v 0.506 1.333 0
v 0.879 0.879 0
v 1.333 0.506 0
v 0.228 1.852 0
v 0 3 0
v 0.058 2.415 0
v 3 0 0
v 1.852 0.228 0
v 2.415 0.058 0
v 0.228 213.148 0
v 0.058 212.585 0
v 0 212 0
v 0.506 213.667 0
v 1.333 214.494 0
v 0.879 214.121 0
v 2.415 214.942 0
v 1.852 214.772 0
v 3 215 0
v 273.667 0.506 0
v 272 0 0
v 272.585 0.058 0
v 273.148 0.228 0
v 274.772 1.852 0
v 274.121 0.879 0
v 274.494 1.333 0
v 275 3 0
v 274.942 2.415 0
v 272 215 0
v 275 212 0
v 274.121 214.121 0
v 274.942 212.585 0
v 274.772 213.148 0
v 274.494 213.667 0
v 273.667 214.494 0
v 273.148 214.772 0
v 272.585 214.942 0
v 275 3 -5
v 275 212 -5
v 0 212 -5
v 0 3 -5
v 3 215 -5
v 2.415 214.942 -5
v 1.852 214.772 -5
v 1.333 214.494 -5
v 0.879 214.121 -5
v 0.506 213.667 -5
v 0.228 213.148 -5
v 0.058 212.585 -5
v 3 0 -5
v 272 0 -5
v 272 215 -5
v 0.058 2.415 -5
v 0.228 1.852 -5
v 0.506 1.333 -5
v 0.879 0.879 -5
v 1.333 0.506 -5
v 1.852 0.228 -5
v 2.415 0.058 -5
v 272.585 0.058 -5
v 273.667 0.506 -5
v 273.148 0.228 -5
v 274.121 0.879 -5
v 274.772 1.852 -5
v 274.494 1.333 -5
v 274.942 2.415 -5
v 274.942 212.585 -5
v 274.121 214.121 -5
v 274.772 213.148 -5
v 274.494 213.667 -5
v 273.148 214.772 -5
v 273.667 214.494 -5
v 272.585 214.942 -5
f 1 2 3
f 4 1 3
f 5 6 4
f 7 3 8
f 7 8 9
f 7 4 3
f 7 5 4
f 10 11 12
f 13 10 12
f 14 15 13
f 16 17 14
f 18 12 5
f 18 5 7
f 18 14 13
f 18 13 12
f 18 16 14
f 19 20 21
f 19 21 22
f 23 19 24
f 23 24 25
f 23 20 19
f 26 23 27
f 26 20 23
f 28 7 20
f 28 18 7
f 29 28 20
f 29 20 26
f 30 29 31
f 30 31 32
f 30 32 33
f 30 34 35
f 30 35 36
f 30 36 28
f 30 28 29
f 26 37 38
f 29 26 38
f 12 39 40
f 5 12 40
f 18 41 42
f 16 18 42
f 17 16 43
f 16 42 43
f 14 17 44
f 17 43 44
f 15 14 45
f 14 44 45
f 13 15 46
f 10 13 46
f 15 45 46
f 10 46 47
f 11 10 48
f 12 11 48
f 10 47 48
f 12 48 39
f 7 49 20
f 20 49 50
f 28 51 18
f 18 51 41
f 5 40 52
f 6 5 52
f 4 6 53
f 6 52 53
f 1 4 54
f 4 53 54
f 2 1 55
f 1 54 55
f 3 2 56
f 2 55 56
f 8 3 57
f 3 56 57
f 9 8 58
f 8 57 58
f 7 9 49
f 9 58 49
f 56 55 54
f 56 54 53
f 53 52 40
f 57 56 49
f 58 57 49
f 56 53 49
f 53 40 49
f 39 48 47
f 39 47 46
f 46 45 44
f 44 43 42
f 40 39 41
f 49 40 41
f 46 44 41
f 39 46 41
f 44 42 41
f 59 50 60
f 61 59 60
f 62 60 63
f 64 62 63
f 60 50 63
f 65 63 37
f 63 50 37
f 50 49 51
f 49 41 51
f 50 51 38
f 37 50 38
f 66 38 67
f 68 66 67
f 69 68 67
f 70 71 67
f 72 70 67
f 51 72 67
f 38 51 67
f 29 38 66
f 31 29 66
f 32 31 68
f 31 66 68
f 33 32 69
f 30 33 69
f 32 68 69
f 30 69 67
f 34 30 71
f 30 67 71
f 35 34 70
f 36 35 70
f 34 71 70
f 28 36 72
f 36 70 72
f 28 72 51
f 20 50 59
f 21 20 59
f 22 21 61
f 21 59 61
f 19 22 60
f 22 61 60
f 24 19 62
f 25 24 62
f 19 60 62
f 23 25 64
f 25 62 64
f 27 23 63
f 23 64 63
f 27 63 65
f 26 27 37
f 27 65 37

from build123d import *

# Parameters (mm, degrees)
CONVERT_SOLID1_START = -5
CONVERT_SOLID1_DEPTH = 5


# Read off the part's stored shape, not the designer's step: Convert-Solid1
with BuildPart() as part:
    # Convert-Solid1 outline → Convert-Solid1 (new body)
    with BuildSketch(Plane.XY.offset(CONVERT_SOLID1_START)):
        with BuildLine():
            ThreePointArc((3, 215), (0.878679656, 214.121320344), (0, 212))
            Line((0, 212), (0, 3))
            ThreePointArc((0, 3), (0.878679656, 0.878679656), (3, 0))
            Line((3, 0), (272, 0))
            ThreePointArc((272, 0), (274.121320344, 0.878679656), (275, 3))
            Line((275, 3), (275, 212))
            ThreePointArc((275, 212), (274.121320344, 214.121320344), (272, 215))
            Line((272, 215), (3, 215))
        make_face()
    extrude(amount=CONVERT_SOLID1_DEPTH)


solid = part.part
